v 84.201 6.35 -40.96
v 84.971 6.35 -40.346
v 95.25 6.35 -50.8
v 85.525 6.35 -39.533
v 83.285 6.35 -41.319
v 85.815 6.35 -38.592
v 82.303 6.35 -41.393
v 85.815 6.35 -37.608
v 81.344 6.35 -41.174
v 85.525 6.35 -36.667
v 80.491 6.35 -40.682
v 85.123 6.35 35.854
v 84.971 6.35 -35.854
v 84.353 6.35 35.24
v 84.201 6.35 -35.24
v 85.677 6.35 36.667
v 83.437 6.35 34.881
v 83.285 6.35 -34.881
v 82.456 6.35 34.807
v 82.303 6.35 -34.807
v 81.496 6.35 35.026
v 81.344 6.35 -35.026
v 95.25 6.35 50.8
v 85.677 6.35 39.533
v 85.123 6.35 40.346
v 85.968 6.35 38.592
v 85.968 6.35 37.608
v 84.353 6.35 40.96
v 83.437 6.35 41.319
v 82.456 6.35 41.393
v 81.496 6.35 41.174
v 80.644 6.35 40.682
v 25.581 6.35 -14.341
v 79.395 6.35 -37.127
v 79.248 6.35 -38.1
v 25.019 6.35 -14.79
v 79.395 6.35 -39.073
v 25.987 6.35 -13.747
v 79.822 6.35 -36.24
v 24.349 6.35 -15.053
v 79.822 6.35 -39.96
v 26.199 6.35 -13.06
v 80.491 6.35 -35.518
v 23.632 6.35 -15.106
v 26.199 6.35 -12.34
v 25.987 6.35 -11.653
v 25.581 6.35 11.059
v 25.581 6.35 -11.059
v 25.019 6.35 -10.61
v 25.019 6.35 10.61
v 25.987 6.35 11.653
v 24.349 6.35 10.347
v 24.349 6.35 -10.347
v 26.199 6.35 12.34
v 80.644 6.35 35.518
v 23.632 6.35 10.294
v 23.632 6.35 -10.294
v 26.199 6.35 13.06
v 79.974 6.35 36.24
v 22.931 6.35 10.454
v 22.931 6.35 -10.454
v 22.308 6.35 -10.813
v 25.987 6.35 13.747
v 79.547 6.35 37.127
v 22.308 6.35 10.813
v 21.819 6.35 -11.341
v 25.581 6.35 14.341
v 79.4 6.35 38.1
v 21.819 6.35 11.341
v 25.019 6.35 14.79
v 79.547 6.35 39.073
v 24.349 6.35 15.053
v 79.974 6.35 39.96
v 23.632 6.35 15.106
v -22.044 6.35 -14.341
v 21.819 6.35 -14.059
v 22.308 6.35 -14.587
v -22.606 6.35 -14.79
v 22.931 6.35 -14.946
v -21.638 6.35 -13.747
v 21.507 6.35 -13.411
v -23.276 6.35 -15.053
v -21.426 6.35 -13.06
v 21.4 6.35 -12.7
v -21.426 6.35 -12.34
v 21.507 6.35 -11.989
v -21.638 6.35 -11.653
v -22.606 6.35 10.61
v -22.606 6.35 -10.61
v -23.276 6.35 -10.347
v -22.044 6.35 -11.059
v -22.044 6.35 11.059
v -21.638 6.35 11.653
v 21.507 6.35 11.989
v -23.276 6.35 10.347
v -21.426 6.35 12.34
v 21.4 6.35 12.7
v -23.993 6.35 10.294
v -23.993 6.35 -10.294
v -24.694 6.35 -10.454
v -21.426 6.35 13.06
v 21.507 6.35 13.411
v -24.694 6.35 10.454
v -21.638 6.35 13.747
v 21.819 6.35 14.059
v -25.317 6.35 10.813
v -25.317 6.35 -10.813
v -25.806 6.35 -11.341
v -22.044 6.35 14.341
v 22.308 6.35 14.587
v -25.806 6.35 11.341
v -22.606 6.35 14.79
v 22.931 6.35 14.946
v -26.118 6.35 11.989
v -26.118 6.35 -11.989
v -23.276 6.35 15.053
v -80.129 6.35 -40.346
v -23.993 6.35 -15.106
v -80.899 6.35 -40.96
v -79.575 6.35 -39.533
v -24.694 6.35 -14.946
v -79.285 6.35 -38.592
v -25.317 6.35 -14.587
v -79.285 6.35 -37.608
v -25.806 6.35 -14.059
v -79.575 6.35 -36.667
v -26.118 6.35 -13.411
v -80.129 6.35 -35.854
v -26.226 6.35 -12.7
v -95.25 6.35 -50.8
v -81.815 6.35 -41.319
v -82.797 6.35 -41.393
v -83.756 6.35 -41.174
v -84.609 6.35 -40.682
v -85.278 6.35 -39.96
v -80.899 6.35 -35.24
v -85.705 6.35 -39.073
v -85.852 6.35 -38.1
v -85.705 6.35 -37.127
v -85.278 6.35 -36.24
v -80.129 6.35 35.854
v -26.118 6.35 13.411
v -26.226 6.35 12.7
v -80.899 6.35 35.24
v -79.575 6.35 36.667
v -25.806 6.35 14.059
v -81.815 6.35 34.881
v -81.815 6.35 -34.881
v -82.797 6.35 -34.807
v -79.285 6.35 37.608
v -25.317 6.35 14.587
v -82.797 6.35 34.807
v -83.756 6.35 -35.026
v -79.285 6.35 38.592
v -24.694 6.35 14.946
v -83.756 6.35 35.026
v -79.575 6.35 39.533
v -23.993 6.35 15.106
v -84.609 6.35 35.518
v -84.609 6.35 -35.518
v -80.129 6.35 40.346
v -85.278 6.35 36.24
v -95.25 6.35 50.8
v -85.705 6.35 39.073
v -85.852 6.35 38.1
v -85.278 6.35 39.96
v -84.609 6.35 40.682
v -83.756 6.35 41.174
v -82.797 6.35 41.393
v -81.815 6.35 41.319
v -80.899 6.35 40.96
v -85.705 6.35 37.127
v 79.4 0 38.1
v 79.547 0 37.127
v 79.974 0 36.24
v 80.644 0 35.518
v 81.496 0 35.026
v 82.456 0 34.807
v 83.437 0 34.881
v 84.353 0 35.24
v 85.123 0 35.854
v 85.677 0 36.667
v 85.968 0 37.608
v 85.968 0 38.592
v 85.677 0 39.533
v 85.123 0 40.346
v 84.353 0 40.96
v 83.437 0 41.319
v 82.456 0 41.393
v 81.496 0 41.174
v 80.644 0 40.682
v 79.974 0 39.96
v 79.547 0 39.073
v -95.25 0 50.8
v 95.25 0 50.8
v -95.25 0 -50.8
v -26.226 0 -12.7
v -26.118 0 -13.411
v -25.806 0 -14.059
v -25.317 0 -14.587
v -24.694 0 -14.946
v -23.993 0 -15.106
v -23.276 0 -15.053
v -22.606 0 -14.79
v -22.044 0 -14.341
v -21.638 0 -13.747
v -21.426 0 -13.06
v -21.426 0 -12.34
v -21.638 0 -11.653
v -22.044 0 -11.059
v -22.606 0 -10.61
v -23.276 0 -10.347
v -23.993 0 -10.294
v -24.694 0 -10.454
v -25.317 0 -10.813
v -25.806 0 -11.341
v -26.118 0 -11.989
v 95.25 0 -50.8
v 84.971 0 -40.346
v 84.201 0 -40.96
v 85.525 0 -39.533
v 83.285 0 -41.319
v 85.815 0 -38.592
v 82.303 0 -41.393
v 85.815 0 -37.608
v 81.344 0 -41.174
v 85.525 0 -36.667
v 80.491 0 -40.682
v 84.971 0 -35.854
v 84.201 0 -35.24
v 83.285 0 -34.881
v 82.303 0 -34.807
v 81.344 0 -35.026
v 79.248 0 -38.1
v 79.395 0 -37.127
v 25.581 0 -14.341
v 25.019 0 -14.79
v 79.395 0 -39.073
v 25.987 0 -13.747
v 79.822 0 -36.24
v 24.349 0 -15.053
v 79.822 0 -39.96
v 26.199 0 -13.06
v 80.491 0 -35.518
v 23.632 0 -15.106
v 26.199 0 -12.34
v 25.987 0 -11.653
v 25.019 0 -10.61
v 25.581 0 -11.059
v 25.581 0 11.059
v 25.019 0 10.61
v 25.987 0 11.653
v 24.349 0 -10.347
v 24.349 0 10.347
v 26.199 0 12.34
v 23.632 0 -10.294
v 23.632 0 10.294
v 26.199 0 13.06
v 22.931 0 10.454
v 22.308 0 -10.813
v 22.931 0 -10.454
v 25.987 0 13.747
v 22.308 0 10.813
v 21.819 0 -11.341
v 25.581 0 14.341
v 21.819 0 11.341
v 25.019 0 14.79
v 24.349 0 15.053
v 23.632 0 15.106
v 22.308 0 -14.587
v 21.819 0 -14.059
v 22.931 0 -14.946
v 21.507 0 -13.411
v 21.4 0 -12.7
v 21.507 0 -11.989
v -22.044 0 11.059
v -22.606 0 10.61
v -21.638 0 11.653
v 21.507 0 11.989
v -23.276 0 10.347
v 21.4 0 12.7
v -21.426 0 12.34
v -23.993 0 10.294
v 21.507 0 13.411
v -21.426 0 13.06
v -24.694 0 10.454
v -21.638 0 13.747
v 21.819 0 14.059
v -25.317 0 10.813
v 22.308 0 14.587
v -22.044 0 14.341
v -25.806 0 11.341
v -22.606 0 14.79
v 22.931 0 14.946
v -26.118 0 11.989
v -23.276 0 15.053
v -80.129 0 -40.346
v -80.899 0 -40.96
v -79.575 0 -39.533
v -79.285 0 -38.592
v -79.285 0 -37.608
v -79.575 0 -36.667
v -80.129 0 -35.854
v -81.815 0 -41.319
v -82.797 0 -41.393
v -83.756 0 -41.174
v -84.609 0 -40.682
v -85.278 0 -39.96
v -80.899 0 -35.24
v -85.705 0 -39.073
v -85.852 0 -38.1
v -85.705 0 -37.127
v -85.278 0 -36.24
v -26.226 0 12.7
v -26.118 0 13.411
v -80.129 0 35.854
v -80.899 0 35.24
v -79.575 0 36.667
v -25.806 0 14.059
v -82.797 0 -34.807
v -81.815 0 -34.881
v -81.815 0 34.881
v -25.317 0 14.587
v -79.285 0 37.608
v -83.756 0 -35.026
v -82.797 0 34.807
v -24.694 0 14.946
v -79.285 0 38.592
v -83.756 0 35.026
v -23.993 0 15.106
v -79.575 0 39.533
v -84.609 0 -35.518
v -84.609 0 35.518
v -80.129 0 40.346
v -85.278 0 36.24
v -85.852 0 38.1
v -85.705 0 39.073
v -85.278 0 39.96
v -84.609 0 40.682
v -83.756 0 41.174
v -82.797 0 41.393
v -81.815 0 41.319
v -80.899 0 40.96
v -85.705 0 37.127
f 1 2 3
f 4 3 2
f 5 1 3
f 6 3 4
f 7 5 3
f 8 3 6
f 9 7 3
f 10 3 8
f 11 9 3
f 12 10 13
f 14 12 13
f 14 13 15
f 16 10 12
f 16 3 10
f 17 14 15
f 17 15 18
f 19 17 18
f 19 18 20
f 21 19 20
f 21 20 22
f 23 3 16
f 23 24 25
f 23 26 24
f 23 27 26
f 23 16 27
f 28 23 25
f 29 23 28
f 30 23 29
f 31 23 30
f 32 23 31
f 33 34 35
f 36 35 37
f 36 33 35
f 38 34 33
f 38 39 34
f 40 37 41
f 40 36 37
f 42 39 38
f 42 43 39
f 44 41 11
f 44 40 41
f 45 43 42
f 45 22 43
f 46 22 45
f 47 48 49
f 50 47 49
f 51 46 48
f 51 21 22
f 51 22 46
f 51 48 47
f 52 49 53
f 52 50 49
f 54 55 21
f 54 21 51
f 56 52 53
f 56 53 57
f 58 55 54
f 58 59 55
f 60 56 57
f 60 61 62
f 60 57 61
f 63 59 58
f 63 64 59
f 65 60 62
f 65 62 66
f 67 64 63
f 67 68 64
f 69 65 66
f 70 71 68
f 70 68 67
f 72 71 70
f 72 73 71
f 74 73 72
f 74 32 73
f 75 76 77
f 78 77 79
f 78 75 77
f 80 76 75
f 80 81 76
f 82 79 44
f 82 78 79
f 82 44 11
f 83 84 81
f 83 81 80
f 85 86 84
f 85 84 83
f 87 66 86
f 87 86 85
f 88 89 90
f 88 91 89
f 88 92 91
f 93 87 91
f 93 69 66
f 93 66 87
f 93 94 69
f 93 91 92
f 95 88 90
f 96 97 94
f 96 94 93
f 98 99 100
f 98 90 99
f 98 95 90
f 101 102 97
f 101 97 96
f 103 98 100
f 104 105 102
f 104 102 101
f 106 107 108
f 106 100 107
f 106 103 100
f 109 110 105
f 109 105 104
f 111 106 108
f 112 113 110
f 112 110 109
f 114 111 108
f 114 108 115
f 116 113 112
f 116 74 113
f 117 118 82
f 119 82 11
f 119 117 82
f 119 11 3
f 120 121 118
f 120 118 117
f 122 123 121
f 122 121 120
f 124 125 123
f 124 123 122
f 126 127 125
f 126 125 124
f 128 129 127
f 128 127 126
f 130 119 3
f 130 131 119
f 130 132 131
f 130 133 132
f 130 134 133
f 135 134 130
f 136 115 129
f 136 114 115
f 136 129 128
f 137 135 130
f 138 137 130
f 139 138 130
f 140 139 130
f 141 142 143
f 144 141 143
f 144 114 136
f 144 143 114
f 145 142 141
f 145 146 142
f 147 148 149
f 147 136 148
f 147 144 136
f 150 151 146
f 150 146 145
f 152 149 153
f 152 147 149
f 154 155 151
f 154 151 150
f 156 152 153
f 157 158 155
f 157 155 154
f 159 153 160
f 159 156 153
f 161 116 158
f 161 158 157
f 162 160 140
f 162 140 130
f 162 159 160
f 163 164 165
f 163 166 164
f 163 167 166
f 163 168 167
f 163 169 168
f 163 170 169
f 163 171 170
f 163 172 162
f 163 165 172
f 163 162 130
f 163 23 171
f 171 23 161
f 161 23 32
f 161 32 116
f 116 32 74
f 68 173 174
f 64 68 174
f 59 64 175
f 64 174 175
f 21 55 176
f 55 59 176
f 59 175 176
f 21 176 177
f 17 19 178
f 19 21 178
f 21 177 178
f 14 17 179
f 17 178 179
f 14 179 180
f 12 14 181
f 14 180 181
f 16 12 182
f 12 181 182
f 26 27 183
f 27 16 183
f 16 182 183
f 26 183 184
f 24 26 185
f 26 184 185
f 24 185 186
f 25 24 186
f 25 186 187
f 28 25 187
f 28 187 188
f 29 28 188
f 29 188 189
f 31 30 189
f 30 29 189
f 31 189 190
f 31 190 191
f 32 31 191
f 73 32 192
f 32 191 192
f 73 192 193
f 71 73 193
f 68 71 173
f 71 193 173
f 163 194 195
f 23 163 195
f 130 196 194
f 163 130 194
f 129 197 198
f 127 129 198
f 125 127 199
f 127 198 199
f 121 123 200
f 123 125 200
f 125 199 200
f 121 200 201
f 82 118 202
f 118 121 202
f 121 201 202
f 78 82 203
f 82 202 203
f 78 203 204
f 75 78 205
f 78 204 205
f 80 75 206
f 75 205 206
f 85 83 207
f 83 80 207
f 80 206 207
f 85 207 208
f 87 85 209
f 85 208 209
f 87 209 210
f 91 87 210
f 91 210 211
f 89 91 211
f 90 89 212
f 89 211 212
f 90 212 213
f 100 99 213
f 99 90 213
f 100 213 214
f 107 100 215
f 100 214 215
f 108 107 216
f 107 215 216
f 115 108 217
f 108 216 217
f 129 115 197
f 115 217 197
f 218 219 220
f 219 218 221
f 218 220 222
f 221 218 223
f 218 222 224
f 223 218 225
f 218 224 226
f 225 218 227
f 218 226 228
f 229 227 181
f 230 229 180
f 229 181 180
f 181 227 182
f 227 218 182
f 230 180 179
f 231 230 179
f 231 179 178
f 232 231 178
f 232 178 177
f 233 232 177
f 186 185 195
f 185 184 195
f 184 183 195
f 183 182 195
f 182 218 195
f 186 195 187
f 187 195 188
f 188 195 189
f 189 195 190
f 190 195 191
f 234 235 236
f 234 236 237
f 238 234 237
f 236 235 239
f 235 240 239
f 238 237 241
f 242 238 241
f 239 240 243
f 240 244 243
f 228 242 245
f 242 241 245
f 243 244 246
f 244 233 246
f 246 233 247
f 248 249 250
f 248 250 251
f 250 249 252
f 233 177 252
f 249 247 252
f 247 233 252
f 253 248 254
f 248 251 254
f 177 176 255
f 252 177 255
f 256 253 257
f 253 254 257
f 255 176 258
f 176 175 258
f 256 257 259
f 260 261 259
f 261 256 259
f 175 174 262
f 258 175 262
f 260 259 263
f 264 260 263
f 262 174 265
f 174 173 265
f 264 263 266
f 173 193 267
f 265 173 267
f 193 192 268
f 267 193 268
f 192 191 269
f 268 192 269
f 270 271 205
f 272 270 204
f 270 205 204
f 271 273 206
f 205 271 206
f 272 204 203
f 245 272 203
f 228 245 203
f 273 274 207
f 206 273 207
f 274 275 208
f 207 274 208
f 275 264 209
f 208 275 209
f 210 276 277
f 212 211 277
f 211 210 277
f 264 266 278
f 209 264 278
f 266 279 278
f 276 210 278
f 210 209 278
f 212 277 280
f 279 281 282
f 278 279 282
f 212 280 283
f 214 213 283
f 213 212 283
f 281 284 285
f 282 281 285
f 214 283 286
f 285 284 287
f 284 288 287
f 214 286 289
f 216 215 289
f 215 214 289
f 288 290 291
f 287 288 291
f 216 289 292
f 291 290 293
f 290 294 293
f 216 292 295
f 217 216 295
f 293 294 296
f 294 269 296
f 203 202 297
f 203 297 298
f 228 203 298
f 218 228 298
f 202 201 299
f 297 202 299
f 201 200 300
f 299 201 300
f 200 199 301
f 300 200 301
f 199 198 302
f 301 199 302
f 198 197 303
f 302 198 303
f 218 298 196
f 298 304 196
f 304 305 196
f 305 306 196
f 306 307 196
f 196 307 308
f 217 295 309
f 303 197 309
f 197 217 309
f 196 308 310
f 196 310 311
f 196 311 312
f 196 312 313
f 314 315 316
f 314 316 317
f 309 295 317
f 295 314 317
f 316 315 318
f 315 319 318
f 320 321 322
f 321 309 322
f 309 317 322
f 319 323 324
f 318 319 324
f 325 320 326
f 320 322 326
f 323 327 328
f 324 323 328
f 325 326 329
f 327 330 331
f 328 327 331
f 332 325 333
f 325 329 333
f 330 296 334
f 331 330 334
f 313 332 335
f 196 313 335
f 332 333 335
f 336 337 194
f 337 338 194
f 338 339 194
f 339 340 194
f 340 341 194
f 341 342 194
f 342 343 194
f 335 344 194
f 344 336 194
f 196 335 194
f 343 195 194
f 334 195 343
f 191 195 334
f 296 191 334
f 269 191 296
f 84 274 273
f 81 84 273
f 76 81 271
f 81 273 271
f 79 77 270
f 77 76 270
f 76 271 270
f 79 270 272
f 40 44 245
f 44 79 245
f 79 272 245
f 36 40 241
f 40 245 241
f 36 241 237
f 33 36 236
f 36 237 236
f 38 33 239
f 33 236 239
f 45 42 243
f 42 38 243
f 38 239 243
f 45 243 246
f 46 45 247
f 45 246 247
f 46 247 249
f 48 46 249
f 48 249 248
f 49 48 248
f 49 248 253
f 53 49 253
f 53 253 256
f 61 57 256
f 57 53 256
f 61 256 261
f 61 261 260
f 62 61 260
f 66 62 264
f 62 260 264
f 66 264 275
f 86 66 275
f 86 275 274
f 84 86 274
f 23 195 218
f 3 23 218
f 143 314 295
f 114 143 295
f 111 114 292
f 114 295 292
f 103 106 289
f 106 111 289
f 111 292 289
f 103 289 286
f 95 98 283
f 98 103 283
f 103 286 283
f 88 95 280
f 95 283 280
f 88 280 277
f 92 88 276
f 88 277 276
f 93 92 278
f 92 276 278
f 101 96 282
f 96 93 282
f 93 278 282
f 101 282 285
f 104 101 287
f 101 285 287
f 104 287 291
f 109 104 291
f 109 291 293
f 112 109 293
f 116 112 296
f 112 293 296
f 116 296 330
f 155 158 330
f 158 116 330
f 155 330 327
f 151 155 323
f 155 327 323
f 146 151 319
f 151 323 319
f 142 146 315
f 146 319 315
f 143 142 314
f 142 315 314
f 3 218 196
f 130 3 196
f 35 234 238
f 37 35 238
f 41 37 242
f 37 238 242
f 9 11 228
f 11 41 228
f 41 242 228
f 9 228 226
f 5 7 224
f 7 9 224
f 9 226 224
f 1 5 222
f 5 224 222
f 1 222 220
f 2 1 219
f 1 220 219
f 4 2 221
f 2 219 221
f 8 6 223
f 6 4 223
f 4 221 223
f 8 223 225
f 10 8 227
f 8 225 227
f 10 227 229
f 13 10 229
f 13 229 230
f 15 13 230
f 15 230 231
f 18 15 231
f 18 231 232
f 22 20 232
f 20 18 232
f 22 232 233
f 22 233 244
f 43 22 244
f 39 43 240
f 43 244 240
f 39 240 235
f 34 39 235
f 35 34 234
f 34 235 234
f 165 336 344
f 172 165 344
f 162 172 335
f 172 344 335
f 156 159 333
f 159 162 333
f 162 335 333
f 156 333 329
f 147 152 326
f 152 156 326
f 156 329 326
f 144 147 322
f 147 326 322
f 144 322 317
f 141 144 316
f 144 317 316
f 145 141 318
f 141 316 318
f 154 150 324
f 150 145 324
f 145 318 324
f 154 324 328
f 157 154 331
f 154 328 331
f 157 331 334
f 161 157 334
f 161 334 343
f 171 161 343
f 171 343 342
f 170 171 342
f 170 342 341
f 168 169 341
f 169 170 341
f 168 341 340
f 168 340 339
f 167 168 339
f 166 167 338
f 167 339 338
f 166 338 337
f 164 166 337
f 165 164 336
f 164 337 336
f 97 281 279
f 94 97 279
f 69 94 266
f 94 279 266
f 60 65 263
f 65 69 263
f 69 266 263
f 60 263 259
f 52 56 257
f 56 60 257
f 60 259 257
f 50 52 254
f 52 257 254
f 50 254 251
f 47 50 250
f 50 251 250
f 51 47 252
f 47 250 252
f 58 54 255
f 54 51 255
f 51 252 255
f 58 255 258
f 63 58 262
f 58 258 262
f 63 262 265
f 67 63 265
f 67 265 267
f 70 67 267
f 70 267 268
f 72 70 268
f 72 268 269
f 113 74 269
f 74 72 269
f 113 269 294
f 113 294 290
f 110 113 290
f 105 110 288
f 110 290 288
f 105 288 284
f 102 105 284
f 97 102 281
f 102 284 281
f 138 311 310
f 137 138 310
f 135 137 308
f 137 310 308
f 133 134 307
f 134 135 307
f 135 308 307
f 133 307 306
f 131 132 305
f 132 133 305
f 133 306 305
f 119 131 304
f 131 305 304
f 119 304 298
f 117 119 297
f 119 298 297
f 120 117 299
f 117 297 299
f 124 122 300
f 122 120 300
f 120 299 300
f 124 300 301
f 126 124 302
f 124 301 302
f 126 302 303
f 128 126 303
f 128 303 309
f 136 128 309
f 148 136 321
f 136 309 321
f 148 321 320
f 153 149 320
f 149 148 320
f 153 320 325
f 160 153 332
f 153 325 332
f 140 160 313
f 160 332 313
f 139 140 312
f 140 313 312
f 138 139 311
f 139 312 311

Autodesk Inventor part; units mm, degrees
ref_plane "YZ Plane" through (0, 0, 0) normal (1, 0, 0) x (0, 1, 0)
ref_plane "XZ Plane" through (0, 0, 0) normal (0, 1, 0) x (-1, 0, 0)
ref_plane "XY Plane" through (0, 0, 0) normal (0, 0, 1) x (1, 0, 0)
sketch "Sketch1" plane through (0, 0, 0) normal (0, 1, 0) x (-1, 0, 0)
  line L0 (95.25, 50.8) -> (-95.25, 50.8)
  line L1 (-95.25, 50.8) -> (-95.25, -50.8)
  line L2 (-95.25, -50.8) -> (95.25, -50.8)
  line L3 (95.25, -50.8) -> (95.25, 50.8)
  line L4 (95.25, 50.8) -> (-95.25, -50.8) construction
  line L5 (-95.25, 50.8) -> (95.25, -50.8) construction
  circle A0 centre (82.55, -38.1) radius 3.302
  circle A1 centre (-82.55, -38.1) radius 3.302
  circle A2 centre (-82.7024, 38.1) radius 3.302
  circle A3 centre (82.55, 38.1) radius 3.302
  line L6 (40.9111, -12.7) -> (-47.9889, -12.7) construction
  line L7 (40.9111, 12.7) -> (-47.9889, 12.7) construction
  circle A4 centre (23.8125, -12.7) radius 2.413
  circle A5 centre (-23.8125, -12.7) radius 2.413
  circle A6 centre (23.8125, 12.7) radius 2.413
  circle A7 centre (-23.8125, 12.7) radius 2.413
  point P0 (0, 0)
  dimension "d0" = 190.5
  dimension "d1" = 101.6
  dimension "d2" = 6.604
  dimension "d3" = 12.7
  dimension "d4" = 12.7
  dimension "d5" = 6.604
  dimension "d6" = 12.7
  dimension "d7" = 6.604
  dimension "d8" = 12.7
  dimension "d9" = 6.604
  dimension "d10" = 88.9
  dimension "d11" = 88.9
  dimension "d12" = 25.4
  dimension "d13" = 12.7
  dimension "d14" = 4.826
  dimension "d15" = 4.826
  dimension "d16" = 47.625
  dimension "d17" = 23.8125
  dimension "d18" = 4.826
  dimension "d19" = 4.826
  dimension "d22" = 12.7
  dimension "d23" = 12.7
extrude "Extrusion1" add sketch "Sketch1" along normal blind 6.35
equation "\"d13\" = 0.5 * d12"
equation "\"d17\" = 0.5 * d16"
properties part number "SequenceMachine_ManifoldPlate"
